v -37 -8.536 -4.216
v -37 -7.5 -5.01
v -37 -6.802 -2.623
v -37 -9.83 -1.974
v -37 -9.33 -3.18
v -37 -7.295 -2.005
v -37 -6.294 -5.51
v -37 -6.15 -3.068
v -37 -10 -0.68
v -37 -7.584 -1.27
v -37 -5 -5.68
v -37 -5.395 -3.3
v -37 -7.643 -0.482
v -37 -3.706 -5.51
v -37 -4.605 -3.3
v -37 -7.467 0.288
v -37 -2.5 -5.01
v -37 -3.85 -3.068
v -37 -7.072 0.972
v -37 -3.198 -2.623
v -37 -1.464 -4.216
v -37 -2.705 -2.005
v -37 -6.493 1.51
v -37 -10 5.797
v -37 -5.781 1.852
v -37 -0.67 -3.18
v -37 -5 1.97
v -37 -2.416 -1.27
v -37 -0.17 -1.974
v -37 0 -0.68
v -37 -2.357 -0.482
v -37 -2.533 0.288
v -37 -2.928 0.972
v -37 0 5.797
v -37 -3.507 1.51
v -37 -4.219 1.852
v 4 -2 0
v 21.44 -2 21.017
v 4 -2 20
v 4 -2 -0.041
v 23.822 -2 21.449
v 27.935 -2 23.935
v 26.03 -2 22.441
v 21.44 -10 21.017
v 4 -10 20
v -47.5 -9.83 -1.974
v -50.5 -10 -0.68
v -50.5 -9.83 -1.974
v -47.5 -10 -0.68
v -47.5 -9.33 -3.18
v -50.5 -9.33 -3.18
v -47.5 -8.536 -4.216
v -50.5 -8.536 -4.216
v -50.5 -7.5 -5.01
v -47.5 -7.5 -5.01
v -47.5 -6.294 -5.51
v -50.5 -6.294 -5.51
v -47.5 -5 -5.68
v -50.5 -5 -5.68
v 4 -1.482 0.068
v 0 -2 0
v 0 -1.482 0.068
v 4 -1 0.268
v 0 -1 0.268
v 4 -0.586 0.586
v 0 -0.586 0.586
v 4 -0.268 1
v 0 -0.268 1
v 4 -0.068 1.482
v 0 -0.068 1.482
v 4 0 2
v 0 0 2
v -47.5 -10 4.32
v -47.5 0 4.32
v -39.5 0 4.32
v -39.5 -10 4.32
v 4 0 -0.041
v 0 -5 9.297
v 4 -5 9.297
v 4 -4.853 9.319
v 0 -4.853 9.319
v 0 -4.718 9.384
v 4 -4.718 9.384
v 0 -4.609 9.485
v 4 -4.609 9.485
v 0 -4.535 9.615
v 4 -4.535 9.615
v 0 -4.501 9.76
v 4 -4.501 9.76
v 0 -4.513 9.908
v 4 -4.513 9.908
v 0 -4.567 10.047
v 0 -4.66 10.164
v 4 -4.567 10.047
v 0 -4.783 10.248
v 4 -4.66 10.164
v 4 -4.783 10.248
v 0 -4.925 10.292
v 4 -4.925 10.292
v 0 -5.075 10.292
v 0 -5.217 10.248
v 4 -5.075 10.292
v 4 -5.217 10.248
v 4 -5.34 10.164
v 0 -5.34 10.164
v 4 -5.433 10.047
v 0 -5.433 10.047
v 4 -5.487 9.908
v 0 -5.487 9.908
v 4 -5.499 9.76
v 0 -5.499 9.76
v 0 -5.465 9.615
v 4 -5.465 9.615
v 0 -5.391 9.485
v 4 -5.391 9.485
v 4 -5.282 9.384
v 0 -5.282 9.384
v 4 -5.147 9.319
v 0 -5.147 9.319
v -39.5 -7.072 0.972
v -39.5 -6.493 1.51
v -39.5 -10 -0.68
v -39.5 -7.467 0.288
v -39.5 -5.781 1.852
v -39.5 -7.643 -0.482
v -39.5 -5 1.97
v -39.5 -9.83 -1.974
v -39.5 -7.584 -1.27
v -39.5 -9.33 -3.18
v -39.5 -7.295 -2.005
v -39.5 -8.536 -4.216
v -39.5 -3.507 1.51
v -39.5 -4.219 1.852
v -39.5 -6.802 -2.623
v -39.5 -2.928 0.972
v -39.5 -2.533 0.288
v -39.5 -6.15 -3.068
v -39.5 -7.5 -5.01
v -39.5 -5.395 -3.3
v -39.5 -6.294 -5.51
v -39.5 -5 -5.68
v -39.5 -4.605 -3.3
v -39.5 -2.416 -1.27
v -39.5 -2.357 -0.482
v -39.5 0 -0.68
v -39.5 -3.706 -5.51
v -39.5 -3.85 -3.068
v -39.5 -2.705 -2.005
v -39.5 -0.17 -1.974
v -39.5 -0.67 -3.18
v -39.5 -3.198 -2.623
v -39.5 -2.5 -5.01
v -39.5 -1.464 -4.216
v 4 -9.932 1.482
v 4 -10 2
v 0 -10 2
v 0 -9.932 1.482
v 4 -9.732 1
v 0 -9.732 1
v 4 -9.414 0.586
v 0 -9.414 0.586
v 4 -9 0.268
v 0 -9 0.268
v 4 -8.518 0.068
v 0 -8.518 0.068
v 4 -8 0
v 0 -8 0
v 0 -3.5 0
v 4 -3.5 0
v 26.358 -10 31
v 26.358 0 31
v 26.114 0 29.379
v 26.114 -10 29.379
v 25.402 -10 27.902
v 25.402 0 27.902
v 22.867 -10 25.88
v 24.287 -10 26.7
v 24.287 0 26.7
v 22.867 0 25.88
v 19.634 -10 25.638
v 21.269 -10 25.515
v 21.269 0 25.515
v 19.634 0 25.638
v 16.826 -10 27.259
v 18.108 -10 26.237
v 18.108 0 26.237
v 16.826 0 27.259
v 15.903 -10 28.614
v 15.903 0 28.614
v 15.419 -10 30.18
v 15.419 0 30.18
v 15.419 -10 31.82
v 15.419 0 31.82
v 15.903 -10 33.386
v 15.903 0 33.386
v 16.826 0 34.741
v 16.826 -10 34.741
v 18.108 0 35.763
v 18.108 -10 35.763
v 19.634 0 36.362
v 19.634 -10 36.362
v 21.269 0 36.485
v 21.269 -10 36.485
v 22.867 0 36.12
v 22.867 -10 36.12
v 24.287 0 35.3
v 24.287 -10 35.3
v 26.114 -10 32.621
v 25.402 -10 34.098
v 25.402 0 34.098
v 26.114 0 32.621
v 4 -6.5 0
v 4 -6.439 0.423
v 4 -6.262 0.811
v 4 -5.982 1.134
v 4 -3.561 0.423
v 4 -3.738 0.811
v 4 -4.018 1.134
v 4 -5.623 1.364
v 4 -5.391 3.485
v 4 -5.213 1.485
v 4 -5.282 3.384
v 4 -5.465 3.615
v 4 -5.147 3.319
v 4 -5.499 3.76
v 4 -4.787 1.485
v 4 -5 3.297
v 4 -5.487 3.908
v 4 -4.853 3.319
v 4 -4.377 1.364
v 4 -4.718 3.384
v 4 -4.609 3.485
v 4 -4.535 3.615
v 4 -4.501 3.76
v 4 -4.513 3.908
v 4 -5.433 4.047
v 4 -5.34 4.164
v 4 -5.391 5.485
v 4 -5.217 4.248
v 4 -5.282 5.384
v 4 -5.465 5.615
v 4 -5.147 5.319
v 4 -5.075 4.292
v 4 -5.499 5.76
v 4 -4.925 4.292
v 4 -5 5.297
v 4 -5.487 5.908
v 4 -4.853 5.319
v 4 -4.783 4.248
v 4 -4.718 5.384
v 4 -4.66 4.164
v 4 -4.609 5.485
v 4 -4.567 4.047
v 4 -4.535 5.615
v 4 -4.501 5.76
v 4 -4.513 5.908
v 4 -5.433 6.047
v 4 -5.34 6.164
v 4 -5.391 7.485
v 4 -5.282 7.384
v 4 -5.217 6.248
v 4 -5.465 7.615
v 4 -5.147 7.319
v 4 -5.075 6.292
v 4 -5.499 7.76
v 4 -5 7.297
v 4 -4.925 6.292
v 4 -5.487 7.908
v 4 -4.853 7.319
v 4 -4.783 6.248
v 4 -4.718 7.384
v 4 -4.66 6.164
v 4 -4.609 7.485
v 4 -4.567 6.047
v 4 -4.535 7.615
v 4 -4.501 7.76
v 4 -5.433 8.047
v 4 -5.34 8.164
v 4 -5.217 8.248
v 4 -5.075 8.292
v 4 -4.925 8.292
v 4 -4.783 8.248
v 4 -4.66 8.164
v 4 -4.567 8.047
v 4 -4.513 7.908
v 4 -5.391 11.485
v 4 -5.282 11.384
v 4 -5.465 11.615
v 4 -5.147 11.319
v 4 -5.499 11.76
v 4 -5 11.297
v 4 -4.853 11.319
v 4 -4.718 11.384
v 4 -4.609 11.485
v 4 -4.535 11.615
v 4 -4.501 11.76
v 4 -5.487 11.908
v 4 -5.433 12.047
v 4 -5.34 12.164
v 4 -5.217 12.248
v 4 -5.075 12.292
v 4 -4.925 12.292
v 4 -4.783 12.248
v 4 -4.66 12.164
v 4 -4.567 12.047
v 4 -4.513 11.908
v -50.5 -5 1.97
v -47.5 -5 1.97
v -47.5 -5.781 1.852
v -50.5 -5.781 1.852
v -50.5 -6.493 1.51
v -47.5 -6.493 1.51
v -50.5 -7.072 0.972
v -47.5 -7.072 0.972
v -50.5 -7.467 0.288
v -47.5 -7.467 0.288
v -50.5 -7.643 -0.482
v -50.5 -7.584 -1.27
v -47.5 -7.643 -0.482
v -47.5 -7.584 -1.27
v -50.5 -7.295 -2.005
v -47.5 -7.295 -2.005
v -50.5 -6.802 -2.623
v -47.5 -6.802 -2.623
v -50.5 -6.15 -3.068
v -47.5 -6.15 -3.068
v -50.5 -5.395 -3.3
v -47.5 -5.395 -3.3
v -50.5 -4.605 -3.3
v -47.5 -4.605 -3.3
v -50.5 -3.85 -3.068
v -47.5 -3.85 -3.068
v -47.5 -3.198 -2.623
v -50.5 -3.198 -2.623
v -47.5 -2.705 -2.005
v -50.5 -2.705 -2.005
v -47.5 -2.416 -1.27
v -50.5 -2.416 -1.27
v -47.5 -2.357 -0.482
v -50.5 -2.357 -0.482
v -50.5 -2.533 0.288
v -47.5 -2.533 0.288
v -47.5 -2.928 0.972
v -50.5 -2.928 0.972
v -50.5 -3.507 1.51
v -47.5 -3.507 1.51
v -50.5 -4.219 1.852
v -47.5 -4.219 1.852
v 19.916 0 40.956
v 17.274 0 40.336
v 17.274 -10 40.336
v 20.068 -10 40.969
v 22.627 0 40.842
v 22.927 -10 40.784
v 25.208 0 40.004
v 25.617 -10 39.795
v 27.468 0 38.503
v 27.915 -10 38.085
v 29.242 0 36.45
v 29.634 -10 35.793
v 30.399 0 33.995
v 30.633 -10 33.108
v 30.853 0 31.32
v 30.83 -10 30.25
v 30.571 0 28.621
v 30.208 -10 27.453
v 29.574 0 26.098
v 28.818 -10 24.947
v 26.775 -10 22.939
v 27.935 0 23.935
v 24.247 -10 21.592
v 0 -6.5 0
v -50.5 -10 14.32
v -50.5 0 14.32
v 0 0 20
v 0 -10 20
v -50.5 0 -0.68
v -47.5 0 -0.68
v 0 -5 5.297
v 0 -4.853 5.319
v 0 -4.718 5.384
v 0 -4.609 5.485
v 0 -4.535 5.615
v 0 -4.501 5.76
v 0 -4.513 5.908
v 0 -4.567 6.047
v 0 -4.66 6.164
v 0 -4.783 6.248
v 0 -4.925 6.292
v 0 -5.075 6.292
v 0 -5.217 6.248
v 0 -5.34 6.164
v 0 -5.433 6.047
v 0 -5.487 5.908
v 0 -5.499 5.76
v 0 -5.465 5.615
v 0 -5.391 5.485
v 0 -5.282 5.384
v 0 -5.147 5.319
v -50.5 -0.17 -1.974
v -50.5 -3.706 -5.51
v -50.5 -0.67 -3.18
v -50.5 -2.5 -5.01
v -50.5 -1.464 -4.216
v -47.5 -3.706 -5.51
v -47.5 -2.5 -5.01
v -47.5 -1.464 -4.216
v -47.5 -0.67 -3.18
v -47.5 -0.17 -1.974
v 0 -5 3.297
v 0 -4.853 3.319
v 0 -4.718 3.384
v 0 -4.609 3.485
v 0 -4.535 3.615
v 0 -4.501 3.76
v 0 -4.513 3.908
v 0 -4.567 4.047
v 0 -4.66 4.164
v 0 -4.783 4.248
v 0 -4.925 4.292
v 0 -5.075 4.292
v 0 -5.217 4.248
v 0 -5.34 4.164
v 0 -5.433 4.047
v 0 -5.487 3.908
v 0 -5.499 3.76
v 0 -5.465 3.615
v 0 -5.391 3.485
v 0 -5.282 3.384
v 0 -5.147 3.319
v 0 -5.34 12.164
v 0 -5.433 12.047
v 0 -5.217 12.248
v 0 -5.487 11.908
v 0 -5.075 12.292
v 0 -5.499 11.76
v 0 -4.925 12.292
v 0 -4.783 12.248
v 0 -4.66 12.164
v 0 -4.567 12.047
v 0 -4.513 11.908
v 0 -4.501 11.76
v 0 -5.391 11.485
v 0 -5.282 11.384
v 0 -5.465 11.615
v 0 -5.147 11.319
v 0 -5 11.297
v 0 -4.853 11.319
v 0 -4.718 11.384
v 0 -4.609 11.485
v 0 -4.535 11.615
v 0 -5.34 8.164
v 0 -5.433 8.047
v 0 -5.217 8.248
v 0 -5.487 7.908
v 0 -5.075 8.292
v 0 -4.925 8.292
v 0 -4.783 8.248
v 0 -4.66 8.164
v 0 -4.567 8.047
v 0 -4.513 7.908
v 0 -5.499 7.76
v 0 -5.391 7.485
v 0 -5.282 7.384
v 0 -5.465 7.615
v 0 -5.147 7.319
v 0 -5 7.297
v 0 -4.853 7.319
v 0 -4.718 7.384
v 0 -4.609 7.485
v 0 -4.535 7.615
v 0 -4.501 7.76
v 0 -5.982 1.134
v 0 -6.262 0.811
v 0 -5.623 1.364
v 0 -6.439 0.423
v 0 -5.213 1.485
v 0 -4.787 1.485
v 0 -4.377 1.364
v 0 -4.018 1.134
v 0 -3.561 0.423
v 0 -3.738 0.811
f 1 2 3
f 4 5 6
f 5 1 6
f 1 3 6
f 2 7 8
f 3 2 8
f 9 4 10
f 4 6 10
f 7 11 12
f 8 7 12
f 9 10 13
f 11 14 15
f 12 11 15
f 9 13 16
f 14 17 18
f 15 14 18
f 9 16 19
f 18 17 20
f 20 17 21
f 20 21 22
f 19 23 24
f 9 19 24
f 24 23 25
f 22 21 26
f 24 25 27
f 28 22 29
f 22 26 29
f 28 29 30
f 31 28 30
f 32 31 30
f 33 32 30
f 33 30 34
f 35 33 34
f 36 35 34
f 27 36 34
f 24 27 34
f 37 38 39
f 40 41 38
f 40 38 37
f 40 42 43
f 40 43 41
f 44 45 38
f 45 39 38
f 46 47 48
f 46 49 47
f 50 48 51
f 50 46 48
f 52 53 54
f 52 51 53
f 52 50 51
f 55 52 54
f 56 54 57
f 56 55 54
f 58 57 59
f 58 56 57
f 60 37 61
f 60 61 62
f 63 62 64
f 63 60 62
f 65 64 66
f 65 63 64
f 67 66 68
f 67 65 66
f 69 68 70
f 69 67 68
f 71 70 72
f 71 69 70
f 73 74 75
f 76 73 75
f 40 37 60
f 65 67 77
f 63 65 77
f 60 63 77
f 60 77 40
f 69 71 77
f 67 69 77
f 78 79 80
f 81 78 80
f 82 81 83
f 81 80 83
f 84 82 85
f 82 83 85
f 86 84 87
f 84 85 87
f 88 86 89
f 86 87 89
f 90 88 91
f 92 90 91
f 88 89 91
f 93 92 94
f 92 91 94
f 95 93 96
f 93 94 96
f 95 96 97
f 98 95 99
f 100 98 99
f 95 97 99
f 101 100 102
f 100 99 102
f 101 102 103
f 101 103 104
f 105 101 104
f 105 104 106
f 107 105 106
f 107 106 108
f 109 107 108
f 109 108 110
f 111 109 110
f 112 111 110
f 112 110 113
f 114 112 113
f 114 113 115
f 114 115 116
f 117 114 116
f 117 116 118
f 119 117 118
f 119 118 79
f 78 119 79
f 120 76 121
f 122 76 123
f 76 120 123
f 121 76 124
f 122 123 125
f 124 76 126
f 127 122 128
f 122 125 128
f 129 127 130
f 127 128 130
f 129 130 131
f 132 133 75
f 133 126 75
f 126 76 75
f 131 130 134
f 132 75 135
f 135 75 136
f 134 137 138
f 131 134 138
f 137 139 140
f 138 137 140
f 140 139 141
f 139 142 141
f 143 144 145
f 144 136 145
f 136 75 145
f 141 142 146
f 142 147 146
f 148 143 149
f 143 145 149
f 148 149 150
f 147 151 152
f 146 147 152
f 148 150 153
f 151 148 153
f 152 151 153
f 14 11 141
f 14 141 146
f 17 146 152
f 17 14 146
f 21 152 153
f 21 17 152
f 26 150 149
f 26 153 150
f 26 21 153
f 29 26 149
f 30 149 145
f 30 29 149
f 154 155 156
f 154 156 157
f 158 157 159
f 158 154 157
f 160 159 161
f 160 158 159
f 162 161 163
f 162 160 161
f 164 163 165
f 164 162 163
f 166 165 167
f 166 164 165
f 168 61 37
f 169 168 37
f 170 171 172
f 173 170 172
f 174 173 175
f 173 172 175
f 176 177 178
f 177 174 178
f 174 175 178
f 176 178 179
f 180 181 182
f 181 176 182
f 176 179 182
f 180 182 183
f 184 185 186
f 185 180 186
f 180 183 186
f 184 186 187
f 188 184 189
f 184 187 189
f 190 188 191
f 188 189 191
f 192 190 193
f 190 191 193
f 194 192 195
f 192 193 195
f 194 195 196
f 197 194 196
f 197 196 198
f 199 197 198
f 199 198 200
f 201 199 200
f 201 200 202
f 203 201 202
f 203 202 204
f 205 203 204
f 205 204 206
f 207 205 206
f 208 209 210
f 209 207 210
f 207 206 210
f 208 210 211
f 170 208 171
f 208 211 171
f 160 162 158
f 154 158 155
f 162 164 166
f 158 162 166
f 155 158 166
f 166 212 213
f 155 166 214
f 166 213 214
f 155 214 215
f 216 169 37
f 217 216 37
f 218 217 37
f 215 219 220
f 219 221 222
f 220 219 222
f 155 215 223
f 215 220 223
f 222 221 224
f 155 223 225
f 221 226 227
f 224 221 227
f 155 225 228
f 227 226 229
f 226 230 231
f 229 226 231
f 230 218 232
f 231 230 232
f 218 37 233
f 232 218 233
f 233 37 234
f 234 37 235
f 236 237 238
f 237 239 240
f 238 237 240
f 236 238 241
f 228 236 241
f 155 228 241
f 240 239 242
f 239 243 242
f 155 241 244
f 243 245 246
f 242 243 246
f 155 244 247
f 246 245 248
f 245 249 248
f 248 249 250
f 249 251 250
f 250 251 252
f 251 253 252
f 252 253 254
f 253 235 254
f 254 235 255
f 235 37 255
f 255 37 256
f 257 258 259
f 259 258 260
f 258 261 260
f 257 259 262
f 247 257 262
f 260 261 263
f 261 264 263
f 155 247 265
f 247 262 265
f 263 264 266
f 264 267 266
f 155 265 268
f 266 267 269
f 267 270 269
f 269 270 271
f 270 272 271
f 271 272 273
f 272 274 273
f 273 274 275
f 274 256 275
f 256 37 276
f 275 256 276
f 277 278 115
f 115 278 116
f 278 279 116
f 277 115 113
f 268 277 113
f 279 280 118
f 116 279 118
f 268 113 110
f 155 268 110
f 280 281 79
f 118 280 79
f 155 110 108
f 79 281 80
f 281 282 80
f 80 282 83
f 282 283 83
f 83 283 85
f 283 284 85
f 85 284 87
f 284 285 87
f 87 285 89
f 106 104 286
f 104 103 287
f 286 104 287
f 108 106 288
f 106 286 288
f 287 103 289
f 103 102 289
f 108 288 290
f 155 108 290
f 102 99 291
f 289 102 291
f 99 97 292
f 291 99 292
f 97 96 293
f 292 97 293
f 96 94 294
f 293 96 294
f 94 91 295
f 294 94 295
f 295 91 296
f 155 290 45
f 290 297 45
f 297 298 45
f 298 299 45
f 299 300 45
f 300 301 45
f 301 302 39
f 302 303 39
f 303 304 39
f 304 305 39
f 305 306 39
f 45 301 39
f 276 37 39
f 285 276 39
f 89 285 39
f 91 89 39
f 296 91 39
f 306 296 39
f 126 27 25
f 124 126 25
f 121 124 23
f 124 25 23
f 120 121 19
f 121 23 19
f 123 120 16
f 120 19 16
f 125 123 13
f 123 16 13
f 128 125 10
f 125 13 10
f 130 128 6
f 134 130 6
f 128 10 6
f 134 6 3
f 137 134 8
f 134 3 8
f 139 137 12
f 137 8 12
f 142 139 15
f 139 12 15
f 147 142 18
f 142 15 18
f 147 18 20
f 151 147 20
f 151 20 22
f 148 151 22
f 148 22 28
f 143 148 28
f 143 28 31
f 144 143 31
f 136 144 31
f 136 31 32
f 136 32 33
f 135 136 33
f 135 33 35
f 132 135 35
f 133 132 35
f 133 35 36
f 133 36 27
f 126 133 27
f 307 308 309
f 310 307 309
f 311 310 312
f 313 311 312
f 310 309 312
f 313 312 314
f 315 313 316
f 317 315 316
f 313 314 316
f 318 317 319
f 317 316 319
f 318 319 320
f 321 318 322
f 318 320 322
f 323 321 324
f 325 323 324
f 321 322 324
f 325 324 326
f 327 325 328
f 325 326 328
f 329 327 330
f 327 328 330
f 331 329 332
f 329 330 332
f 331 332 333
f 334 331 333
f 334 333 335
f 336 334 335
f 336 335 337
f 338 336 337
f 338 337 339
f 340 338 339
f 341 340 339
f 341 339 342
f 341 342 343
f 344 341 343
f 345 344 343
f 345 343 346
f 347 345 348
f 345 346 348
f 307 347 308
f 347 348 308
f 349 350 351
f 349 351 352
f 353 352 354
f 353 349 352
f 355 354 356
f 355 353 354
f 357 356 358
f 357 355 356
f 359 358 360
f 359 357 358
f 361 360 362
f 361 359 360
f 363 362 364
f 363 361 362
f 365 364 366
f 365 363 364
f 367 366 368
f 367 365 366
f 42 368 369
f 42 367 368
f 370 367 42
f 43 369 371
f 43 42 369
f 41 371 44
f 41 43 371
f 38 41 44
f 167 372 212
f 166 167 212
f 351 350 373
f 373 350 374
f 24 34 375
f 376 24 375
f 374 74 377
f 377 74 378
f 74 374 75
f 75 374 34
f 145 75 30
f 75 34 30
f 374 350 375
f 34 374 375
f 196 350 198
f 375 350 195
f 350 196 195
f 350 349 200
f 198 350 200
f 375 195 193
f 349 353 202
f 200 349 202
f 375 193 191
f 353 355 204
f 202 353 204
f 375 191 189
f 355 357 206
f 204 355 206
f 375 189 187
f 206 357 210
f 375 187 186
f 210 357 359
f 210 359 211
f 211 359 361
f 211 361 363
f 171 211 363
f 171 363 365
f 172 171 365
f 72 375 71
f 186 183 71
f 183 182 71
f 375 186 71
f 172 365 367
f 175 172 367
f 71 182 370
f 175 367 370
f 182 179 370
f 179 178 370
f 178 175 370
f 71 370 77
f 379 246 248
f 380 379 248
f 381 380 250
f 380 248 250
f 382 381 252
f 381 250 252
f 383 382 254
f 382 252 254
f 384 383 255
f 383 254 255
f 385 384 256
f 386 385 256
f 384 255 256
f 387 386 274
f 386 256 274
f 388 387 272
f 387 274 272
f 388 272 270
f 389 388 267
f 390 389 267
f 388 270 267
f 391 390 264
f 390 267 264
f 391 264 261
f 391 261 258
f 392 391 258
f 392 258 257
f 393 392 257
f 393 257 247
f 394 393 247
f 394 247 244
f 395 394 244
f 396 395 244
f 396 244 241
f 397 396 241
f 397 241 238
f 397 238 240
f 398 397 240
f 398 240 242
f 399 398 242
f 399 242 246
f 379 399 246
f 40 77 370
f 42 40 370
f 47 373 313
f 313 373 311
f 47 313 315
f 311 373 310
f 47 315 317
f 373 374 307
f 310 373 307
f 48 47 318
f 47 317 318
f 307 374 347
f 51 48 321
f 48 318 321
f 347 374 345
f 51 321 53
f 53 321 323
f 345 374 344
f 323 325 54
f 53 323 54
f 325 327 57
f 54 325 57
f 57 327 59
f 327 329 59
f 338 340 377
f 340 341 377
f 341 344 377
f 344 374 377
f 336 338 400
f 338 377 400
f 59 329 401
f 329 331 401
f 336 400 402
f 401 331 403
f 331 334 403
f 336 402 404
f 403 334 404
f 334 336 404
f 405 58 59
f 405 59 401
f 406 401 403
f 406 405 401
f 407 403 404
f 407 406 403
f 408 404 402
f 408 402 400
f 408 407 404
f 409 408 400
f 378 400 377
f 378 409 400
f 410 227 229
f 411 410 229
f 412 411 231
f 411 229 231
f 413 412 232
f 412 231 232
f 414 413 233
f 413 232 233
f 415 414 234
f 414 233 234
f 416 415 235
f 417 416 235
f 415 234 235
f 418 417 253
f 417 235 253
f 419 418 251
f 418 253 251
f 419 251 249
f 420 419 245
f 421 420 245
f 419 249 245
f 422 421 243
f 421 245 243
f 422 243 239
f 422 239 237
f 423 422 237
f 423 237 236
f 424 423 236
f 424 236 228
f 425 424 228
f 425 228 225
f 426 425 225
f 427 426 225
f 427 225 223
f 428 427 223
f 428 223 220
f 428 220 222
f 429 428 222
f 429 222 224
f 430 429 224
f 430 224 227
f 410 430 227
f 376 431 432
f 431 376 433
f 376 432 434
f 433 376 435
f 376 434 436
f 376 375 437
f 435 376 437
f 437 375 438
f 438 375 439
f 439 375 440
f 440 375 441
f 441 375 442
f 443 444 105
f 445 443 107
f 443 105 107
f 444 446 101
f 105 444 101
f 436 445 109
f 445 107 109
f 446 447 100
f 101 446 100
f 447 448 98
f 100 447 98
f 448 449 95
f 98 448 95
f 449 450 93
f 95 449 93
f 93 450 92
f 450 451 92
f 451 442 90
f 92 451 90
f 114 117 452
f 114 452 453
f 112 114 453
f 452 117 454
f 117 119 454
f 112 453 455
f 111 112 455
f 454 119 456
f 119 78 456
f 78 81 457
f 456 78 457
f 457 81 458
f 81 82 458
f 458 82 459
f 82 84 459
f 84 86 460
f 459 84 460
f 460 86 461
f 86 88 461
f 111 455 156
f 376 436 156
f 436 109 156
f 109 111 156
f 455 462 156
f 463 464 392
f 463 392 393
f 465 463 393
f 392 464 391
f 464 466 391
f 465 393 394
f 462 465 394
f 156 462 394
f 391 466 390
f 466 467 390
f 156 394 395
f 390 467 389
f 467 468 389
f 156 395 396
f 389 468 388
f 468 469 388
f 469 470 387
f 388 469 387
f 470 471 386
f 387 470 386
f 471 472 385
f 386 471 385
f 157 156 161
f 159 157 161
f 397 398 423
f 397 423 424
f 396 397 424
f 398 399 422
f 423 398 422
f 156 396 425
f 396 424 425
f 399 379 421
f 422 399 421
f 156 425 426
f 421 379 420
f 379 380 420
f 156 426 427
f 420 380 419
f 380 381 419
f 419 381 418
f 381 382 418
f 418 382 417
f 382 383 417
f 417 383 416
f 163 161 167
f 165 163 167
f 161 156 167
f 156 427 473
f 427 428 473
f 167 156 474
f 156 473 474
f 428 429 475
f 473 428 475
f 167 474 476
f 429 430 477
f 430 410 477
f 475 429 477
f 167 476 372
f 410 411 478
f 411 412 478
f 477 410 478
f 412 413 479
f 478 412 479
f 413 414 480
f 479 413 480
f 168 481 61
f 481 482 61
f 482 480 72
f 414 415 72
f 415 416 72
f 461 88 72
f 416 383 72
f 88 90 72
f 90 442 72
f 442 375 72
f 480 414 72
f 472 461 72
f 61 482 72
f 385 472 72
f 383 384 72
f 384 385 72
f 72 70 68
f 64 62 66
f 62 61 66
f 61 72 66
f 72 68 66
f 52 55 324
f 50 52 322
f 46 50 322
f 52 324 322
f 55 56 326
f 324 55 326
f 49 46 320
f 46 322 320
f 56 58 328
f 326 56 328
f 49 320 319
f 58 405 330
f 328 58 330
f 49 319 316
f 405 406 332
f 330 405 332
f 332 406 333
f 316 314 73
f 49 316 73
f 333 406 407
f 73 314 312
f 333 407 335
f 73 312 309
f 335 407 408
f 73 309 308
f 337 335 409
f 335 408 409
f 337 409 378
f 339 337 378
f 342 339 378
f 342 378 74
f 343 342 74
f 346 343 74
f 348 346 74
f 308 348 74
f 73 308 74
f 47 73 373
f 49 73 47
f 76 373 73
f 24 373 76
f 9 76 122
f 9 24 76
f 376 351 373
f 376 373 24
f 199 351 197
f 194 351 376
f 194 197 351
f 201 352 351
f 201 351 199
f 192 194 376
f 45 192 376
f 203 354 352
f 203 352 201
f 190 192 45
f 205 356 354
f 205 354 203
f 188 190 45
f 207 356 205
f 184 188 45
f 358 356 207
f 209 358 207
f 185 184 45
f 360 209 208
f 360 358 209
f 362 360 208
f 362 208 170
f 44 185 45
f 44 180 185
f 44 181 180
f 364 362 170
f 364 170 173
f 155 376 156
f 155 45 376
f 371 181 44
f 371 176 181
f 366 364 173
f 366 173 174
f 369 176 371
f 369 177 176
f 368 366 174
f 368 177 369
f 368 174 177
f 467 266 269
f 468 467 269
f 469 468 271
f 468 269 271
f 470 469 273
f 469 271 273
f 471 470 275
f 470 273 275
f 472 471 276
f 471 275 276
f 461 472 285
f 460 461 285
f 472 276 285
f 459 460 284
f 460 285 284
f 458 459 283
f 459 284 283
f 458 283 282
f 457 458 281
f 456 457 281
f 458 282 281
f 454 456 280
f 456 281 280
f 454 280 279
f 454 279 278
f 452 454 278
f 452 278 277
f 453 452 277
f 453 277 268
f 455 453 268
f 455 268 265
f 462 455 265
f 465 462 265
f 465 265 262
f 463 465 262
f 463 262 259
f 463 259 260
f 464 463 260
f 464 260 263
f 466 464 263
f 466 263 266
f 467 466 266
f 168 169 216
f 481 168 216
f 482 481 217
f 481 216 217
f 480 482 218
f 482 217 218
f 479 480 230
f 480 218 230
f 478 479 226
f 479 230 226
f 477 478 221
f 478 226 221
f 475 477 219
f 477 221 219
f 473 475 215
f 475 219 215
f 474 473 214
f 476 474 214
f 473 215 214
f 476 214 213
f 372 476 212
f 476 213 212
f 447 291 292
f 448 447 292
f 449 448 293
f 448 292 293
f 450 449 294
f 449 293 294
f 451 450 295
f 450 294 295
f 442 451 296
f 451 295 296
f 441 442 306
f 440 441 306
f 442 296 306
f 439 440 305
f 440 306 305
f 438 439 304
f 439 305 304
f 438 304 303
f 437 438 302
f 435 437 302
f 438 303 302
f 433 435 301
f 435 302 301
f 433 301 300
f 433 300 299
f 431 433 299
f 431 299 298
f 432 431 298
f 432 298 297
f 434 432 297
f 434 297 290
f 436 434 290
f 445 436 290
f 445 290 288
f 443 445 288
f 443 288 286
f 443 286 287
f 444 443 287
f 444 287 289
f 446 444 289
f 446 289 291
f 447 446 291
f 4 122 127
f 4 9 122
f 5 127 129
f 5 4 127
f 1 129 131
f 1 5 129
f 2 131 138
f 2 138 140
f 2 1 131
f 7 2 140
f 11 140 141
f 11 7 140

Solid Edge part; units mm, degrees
sketch "Sketch1" plane through (0, 0, 0) normal (0, -1, 0) x (1, 0, 0)
  line L0 (-50.5, 14.32) -> (-50.5, -5.68)
  line L1 (-50.5, -5.68) -> (-47.5, -5.68)
  line L2 (-47.5, -5.68) -> (-47.5, 4.32)
  line L3 (-47.5, 4.32) -> (-39.5, 4.32)
  line L4 (-39.5, 4.32) -> (-39.5, -5.68)
  line L5 (-39.5, -5.68) -> (-37, -5.68)
  line L6 (-37, -5.68) -> (-37, 5.7972)
  line L7 (-37, 5.7972) -> (0, 20)
  line L8 (0, 20) -> (0, 0)
  line L9 (0, 0) -> (4, 0)
  line L10 (4, 0) -> (4, 20)
  line L11 (4, 20) -> (21.44, 21.017)
  arc A0 (21.44, 21.017) -> (17.2742, 40.3358) centre (20.8579, 31) ccw
  line L12 (17.2742, 40.3358) -> (-50.5, 14.32)
  circle A1 centre (20.8579, 31) radius 5.5
  dimension "D1" = 3
  dimension "D2" = 2.5
  dimension "D3" = 8
  dimension "D4" = 20
  dimension "D5" = 4
  dimension "D6" = 20
  dimension "D7" = 37
  dimension "D8" = 31
  dimension "D9" = 5.68
  dimension "D10" = 71.3579
  dimension "D11" = 10
  dimension "D12" = 11.4772
  dimension "D13" = 72.5959
  dimension "D14" = 10
extrude "Protrusion1" add sketch "Sketch1" along normal blind 10
sketch "Sketch2" plane through (0, 0, 0) normal (0, -1, 0) x (1, 0, 0)
  line L0 (4, 20) -> (4, 0)
  line L1 (4, 20) -> (21.44, 21.017)
  line L2 (4.0411, 0) -> (27.935, 23.935)
  arc A0 (21.44, 21.017) -> (27.935, 23.935) centre (20.8579, 31) ccw
extrude "ProtrusiónExtruida_2" add sketch "Sketch2" along normal blind 2 material side at (4.05, 0, 10)
fillet "Redondeo_1" radius 5 4 edges at (-49, -10, -5.68) (-38.25, -10, -5.68) (-38.25, 0, -5.68) (-49, 0, -5.68)
fillet "Redondeo_2" radius 2 2 edges at (2, -10, 0) (2, 0, 0)
hole "Agujero_1" at (-50.5, -5, -0.68) direction (1, 0, 0) diameter 5.3 depth 31.9512
sketch "Sketch3" plane through (4, -6, 10) normal (1, 0, 0) x (0, 1, 0)
  circle A0 centre (1, -10) radius 1.5
extrude "Cutout1" cut sketch "Sketch3" against normal up to next
hole "Agujero_3" at (4, -5, 7.7972) direction (-1, 0, 0) diameter 1 end up to next
hole "Hole1" at (4, -5, 9.7972) direction (-1, 0, 0) diameter 1 end up to next
hole "Hole2" at (4, -5, 11.7972) direction (-1, 0, 0) diameter 1 end up to next
hole "Hole3" at (4, -5, 5.7972) direction (-1, 0, 0) diameter 1 end up to next
hole "Hole4" at (4, -5, 3.7972) direction (-1, 0, 0) diameter 1 end up to next
